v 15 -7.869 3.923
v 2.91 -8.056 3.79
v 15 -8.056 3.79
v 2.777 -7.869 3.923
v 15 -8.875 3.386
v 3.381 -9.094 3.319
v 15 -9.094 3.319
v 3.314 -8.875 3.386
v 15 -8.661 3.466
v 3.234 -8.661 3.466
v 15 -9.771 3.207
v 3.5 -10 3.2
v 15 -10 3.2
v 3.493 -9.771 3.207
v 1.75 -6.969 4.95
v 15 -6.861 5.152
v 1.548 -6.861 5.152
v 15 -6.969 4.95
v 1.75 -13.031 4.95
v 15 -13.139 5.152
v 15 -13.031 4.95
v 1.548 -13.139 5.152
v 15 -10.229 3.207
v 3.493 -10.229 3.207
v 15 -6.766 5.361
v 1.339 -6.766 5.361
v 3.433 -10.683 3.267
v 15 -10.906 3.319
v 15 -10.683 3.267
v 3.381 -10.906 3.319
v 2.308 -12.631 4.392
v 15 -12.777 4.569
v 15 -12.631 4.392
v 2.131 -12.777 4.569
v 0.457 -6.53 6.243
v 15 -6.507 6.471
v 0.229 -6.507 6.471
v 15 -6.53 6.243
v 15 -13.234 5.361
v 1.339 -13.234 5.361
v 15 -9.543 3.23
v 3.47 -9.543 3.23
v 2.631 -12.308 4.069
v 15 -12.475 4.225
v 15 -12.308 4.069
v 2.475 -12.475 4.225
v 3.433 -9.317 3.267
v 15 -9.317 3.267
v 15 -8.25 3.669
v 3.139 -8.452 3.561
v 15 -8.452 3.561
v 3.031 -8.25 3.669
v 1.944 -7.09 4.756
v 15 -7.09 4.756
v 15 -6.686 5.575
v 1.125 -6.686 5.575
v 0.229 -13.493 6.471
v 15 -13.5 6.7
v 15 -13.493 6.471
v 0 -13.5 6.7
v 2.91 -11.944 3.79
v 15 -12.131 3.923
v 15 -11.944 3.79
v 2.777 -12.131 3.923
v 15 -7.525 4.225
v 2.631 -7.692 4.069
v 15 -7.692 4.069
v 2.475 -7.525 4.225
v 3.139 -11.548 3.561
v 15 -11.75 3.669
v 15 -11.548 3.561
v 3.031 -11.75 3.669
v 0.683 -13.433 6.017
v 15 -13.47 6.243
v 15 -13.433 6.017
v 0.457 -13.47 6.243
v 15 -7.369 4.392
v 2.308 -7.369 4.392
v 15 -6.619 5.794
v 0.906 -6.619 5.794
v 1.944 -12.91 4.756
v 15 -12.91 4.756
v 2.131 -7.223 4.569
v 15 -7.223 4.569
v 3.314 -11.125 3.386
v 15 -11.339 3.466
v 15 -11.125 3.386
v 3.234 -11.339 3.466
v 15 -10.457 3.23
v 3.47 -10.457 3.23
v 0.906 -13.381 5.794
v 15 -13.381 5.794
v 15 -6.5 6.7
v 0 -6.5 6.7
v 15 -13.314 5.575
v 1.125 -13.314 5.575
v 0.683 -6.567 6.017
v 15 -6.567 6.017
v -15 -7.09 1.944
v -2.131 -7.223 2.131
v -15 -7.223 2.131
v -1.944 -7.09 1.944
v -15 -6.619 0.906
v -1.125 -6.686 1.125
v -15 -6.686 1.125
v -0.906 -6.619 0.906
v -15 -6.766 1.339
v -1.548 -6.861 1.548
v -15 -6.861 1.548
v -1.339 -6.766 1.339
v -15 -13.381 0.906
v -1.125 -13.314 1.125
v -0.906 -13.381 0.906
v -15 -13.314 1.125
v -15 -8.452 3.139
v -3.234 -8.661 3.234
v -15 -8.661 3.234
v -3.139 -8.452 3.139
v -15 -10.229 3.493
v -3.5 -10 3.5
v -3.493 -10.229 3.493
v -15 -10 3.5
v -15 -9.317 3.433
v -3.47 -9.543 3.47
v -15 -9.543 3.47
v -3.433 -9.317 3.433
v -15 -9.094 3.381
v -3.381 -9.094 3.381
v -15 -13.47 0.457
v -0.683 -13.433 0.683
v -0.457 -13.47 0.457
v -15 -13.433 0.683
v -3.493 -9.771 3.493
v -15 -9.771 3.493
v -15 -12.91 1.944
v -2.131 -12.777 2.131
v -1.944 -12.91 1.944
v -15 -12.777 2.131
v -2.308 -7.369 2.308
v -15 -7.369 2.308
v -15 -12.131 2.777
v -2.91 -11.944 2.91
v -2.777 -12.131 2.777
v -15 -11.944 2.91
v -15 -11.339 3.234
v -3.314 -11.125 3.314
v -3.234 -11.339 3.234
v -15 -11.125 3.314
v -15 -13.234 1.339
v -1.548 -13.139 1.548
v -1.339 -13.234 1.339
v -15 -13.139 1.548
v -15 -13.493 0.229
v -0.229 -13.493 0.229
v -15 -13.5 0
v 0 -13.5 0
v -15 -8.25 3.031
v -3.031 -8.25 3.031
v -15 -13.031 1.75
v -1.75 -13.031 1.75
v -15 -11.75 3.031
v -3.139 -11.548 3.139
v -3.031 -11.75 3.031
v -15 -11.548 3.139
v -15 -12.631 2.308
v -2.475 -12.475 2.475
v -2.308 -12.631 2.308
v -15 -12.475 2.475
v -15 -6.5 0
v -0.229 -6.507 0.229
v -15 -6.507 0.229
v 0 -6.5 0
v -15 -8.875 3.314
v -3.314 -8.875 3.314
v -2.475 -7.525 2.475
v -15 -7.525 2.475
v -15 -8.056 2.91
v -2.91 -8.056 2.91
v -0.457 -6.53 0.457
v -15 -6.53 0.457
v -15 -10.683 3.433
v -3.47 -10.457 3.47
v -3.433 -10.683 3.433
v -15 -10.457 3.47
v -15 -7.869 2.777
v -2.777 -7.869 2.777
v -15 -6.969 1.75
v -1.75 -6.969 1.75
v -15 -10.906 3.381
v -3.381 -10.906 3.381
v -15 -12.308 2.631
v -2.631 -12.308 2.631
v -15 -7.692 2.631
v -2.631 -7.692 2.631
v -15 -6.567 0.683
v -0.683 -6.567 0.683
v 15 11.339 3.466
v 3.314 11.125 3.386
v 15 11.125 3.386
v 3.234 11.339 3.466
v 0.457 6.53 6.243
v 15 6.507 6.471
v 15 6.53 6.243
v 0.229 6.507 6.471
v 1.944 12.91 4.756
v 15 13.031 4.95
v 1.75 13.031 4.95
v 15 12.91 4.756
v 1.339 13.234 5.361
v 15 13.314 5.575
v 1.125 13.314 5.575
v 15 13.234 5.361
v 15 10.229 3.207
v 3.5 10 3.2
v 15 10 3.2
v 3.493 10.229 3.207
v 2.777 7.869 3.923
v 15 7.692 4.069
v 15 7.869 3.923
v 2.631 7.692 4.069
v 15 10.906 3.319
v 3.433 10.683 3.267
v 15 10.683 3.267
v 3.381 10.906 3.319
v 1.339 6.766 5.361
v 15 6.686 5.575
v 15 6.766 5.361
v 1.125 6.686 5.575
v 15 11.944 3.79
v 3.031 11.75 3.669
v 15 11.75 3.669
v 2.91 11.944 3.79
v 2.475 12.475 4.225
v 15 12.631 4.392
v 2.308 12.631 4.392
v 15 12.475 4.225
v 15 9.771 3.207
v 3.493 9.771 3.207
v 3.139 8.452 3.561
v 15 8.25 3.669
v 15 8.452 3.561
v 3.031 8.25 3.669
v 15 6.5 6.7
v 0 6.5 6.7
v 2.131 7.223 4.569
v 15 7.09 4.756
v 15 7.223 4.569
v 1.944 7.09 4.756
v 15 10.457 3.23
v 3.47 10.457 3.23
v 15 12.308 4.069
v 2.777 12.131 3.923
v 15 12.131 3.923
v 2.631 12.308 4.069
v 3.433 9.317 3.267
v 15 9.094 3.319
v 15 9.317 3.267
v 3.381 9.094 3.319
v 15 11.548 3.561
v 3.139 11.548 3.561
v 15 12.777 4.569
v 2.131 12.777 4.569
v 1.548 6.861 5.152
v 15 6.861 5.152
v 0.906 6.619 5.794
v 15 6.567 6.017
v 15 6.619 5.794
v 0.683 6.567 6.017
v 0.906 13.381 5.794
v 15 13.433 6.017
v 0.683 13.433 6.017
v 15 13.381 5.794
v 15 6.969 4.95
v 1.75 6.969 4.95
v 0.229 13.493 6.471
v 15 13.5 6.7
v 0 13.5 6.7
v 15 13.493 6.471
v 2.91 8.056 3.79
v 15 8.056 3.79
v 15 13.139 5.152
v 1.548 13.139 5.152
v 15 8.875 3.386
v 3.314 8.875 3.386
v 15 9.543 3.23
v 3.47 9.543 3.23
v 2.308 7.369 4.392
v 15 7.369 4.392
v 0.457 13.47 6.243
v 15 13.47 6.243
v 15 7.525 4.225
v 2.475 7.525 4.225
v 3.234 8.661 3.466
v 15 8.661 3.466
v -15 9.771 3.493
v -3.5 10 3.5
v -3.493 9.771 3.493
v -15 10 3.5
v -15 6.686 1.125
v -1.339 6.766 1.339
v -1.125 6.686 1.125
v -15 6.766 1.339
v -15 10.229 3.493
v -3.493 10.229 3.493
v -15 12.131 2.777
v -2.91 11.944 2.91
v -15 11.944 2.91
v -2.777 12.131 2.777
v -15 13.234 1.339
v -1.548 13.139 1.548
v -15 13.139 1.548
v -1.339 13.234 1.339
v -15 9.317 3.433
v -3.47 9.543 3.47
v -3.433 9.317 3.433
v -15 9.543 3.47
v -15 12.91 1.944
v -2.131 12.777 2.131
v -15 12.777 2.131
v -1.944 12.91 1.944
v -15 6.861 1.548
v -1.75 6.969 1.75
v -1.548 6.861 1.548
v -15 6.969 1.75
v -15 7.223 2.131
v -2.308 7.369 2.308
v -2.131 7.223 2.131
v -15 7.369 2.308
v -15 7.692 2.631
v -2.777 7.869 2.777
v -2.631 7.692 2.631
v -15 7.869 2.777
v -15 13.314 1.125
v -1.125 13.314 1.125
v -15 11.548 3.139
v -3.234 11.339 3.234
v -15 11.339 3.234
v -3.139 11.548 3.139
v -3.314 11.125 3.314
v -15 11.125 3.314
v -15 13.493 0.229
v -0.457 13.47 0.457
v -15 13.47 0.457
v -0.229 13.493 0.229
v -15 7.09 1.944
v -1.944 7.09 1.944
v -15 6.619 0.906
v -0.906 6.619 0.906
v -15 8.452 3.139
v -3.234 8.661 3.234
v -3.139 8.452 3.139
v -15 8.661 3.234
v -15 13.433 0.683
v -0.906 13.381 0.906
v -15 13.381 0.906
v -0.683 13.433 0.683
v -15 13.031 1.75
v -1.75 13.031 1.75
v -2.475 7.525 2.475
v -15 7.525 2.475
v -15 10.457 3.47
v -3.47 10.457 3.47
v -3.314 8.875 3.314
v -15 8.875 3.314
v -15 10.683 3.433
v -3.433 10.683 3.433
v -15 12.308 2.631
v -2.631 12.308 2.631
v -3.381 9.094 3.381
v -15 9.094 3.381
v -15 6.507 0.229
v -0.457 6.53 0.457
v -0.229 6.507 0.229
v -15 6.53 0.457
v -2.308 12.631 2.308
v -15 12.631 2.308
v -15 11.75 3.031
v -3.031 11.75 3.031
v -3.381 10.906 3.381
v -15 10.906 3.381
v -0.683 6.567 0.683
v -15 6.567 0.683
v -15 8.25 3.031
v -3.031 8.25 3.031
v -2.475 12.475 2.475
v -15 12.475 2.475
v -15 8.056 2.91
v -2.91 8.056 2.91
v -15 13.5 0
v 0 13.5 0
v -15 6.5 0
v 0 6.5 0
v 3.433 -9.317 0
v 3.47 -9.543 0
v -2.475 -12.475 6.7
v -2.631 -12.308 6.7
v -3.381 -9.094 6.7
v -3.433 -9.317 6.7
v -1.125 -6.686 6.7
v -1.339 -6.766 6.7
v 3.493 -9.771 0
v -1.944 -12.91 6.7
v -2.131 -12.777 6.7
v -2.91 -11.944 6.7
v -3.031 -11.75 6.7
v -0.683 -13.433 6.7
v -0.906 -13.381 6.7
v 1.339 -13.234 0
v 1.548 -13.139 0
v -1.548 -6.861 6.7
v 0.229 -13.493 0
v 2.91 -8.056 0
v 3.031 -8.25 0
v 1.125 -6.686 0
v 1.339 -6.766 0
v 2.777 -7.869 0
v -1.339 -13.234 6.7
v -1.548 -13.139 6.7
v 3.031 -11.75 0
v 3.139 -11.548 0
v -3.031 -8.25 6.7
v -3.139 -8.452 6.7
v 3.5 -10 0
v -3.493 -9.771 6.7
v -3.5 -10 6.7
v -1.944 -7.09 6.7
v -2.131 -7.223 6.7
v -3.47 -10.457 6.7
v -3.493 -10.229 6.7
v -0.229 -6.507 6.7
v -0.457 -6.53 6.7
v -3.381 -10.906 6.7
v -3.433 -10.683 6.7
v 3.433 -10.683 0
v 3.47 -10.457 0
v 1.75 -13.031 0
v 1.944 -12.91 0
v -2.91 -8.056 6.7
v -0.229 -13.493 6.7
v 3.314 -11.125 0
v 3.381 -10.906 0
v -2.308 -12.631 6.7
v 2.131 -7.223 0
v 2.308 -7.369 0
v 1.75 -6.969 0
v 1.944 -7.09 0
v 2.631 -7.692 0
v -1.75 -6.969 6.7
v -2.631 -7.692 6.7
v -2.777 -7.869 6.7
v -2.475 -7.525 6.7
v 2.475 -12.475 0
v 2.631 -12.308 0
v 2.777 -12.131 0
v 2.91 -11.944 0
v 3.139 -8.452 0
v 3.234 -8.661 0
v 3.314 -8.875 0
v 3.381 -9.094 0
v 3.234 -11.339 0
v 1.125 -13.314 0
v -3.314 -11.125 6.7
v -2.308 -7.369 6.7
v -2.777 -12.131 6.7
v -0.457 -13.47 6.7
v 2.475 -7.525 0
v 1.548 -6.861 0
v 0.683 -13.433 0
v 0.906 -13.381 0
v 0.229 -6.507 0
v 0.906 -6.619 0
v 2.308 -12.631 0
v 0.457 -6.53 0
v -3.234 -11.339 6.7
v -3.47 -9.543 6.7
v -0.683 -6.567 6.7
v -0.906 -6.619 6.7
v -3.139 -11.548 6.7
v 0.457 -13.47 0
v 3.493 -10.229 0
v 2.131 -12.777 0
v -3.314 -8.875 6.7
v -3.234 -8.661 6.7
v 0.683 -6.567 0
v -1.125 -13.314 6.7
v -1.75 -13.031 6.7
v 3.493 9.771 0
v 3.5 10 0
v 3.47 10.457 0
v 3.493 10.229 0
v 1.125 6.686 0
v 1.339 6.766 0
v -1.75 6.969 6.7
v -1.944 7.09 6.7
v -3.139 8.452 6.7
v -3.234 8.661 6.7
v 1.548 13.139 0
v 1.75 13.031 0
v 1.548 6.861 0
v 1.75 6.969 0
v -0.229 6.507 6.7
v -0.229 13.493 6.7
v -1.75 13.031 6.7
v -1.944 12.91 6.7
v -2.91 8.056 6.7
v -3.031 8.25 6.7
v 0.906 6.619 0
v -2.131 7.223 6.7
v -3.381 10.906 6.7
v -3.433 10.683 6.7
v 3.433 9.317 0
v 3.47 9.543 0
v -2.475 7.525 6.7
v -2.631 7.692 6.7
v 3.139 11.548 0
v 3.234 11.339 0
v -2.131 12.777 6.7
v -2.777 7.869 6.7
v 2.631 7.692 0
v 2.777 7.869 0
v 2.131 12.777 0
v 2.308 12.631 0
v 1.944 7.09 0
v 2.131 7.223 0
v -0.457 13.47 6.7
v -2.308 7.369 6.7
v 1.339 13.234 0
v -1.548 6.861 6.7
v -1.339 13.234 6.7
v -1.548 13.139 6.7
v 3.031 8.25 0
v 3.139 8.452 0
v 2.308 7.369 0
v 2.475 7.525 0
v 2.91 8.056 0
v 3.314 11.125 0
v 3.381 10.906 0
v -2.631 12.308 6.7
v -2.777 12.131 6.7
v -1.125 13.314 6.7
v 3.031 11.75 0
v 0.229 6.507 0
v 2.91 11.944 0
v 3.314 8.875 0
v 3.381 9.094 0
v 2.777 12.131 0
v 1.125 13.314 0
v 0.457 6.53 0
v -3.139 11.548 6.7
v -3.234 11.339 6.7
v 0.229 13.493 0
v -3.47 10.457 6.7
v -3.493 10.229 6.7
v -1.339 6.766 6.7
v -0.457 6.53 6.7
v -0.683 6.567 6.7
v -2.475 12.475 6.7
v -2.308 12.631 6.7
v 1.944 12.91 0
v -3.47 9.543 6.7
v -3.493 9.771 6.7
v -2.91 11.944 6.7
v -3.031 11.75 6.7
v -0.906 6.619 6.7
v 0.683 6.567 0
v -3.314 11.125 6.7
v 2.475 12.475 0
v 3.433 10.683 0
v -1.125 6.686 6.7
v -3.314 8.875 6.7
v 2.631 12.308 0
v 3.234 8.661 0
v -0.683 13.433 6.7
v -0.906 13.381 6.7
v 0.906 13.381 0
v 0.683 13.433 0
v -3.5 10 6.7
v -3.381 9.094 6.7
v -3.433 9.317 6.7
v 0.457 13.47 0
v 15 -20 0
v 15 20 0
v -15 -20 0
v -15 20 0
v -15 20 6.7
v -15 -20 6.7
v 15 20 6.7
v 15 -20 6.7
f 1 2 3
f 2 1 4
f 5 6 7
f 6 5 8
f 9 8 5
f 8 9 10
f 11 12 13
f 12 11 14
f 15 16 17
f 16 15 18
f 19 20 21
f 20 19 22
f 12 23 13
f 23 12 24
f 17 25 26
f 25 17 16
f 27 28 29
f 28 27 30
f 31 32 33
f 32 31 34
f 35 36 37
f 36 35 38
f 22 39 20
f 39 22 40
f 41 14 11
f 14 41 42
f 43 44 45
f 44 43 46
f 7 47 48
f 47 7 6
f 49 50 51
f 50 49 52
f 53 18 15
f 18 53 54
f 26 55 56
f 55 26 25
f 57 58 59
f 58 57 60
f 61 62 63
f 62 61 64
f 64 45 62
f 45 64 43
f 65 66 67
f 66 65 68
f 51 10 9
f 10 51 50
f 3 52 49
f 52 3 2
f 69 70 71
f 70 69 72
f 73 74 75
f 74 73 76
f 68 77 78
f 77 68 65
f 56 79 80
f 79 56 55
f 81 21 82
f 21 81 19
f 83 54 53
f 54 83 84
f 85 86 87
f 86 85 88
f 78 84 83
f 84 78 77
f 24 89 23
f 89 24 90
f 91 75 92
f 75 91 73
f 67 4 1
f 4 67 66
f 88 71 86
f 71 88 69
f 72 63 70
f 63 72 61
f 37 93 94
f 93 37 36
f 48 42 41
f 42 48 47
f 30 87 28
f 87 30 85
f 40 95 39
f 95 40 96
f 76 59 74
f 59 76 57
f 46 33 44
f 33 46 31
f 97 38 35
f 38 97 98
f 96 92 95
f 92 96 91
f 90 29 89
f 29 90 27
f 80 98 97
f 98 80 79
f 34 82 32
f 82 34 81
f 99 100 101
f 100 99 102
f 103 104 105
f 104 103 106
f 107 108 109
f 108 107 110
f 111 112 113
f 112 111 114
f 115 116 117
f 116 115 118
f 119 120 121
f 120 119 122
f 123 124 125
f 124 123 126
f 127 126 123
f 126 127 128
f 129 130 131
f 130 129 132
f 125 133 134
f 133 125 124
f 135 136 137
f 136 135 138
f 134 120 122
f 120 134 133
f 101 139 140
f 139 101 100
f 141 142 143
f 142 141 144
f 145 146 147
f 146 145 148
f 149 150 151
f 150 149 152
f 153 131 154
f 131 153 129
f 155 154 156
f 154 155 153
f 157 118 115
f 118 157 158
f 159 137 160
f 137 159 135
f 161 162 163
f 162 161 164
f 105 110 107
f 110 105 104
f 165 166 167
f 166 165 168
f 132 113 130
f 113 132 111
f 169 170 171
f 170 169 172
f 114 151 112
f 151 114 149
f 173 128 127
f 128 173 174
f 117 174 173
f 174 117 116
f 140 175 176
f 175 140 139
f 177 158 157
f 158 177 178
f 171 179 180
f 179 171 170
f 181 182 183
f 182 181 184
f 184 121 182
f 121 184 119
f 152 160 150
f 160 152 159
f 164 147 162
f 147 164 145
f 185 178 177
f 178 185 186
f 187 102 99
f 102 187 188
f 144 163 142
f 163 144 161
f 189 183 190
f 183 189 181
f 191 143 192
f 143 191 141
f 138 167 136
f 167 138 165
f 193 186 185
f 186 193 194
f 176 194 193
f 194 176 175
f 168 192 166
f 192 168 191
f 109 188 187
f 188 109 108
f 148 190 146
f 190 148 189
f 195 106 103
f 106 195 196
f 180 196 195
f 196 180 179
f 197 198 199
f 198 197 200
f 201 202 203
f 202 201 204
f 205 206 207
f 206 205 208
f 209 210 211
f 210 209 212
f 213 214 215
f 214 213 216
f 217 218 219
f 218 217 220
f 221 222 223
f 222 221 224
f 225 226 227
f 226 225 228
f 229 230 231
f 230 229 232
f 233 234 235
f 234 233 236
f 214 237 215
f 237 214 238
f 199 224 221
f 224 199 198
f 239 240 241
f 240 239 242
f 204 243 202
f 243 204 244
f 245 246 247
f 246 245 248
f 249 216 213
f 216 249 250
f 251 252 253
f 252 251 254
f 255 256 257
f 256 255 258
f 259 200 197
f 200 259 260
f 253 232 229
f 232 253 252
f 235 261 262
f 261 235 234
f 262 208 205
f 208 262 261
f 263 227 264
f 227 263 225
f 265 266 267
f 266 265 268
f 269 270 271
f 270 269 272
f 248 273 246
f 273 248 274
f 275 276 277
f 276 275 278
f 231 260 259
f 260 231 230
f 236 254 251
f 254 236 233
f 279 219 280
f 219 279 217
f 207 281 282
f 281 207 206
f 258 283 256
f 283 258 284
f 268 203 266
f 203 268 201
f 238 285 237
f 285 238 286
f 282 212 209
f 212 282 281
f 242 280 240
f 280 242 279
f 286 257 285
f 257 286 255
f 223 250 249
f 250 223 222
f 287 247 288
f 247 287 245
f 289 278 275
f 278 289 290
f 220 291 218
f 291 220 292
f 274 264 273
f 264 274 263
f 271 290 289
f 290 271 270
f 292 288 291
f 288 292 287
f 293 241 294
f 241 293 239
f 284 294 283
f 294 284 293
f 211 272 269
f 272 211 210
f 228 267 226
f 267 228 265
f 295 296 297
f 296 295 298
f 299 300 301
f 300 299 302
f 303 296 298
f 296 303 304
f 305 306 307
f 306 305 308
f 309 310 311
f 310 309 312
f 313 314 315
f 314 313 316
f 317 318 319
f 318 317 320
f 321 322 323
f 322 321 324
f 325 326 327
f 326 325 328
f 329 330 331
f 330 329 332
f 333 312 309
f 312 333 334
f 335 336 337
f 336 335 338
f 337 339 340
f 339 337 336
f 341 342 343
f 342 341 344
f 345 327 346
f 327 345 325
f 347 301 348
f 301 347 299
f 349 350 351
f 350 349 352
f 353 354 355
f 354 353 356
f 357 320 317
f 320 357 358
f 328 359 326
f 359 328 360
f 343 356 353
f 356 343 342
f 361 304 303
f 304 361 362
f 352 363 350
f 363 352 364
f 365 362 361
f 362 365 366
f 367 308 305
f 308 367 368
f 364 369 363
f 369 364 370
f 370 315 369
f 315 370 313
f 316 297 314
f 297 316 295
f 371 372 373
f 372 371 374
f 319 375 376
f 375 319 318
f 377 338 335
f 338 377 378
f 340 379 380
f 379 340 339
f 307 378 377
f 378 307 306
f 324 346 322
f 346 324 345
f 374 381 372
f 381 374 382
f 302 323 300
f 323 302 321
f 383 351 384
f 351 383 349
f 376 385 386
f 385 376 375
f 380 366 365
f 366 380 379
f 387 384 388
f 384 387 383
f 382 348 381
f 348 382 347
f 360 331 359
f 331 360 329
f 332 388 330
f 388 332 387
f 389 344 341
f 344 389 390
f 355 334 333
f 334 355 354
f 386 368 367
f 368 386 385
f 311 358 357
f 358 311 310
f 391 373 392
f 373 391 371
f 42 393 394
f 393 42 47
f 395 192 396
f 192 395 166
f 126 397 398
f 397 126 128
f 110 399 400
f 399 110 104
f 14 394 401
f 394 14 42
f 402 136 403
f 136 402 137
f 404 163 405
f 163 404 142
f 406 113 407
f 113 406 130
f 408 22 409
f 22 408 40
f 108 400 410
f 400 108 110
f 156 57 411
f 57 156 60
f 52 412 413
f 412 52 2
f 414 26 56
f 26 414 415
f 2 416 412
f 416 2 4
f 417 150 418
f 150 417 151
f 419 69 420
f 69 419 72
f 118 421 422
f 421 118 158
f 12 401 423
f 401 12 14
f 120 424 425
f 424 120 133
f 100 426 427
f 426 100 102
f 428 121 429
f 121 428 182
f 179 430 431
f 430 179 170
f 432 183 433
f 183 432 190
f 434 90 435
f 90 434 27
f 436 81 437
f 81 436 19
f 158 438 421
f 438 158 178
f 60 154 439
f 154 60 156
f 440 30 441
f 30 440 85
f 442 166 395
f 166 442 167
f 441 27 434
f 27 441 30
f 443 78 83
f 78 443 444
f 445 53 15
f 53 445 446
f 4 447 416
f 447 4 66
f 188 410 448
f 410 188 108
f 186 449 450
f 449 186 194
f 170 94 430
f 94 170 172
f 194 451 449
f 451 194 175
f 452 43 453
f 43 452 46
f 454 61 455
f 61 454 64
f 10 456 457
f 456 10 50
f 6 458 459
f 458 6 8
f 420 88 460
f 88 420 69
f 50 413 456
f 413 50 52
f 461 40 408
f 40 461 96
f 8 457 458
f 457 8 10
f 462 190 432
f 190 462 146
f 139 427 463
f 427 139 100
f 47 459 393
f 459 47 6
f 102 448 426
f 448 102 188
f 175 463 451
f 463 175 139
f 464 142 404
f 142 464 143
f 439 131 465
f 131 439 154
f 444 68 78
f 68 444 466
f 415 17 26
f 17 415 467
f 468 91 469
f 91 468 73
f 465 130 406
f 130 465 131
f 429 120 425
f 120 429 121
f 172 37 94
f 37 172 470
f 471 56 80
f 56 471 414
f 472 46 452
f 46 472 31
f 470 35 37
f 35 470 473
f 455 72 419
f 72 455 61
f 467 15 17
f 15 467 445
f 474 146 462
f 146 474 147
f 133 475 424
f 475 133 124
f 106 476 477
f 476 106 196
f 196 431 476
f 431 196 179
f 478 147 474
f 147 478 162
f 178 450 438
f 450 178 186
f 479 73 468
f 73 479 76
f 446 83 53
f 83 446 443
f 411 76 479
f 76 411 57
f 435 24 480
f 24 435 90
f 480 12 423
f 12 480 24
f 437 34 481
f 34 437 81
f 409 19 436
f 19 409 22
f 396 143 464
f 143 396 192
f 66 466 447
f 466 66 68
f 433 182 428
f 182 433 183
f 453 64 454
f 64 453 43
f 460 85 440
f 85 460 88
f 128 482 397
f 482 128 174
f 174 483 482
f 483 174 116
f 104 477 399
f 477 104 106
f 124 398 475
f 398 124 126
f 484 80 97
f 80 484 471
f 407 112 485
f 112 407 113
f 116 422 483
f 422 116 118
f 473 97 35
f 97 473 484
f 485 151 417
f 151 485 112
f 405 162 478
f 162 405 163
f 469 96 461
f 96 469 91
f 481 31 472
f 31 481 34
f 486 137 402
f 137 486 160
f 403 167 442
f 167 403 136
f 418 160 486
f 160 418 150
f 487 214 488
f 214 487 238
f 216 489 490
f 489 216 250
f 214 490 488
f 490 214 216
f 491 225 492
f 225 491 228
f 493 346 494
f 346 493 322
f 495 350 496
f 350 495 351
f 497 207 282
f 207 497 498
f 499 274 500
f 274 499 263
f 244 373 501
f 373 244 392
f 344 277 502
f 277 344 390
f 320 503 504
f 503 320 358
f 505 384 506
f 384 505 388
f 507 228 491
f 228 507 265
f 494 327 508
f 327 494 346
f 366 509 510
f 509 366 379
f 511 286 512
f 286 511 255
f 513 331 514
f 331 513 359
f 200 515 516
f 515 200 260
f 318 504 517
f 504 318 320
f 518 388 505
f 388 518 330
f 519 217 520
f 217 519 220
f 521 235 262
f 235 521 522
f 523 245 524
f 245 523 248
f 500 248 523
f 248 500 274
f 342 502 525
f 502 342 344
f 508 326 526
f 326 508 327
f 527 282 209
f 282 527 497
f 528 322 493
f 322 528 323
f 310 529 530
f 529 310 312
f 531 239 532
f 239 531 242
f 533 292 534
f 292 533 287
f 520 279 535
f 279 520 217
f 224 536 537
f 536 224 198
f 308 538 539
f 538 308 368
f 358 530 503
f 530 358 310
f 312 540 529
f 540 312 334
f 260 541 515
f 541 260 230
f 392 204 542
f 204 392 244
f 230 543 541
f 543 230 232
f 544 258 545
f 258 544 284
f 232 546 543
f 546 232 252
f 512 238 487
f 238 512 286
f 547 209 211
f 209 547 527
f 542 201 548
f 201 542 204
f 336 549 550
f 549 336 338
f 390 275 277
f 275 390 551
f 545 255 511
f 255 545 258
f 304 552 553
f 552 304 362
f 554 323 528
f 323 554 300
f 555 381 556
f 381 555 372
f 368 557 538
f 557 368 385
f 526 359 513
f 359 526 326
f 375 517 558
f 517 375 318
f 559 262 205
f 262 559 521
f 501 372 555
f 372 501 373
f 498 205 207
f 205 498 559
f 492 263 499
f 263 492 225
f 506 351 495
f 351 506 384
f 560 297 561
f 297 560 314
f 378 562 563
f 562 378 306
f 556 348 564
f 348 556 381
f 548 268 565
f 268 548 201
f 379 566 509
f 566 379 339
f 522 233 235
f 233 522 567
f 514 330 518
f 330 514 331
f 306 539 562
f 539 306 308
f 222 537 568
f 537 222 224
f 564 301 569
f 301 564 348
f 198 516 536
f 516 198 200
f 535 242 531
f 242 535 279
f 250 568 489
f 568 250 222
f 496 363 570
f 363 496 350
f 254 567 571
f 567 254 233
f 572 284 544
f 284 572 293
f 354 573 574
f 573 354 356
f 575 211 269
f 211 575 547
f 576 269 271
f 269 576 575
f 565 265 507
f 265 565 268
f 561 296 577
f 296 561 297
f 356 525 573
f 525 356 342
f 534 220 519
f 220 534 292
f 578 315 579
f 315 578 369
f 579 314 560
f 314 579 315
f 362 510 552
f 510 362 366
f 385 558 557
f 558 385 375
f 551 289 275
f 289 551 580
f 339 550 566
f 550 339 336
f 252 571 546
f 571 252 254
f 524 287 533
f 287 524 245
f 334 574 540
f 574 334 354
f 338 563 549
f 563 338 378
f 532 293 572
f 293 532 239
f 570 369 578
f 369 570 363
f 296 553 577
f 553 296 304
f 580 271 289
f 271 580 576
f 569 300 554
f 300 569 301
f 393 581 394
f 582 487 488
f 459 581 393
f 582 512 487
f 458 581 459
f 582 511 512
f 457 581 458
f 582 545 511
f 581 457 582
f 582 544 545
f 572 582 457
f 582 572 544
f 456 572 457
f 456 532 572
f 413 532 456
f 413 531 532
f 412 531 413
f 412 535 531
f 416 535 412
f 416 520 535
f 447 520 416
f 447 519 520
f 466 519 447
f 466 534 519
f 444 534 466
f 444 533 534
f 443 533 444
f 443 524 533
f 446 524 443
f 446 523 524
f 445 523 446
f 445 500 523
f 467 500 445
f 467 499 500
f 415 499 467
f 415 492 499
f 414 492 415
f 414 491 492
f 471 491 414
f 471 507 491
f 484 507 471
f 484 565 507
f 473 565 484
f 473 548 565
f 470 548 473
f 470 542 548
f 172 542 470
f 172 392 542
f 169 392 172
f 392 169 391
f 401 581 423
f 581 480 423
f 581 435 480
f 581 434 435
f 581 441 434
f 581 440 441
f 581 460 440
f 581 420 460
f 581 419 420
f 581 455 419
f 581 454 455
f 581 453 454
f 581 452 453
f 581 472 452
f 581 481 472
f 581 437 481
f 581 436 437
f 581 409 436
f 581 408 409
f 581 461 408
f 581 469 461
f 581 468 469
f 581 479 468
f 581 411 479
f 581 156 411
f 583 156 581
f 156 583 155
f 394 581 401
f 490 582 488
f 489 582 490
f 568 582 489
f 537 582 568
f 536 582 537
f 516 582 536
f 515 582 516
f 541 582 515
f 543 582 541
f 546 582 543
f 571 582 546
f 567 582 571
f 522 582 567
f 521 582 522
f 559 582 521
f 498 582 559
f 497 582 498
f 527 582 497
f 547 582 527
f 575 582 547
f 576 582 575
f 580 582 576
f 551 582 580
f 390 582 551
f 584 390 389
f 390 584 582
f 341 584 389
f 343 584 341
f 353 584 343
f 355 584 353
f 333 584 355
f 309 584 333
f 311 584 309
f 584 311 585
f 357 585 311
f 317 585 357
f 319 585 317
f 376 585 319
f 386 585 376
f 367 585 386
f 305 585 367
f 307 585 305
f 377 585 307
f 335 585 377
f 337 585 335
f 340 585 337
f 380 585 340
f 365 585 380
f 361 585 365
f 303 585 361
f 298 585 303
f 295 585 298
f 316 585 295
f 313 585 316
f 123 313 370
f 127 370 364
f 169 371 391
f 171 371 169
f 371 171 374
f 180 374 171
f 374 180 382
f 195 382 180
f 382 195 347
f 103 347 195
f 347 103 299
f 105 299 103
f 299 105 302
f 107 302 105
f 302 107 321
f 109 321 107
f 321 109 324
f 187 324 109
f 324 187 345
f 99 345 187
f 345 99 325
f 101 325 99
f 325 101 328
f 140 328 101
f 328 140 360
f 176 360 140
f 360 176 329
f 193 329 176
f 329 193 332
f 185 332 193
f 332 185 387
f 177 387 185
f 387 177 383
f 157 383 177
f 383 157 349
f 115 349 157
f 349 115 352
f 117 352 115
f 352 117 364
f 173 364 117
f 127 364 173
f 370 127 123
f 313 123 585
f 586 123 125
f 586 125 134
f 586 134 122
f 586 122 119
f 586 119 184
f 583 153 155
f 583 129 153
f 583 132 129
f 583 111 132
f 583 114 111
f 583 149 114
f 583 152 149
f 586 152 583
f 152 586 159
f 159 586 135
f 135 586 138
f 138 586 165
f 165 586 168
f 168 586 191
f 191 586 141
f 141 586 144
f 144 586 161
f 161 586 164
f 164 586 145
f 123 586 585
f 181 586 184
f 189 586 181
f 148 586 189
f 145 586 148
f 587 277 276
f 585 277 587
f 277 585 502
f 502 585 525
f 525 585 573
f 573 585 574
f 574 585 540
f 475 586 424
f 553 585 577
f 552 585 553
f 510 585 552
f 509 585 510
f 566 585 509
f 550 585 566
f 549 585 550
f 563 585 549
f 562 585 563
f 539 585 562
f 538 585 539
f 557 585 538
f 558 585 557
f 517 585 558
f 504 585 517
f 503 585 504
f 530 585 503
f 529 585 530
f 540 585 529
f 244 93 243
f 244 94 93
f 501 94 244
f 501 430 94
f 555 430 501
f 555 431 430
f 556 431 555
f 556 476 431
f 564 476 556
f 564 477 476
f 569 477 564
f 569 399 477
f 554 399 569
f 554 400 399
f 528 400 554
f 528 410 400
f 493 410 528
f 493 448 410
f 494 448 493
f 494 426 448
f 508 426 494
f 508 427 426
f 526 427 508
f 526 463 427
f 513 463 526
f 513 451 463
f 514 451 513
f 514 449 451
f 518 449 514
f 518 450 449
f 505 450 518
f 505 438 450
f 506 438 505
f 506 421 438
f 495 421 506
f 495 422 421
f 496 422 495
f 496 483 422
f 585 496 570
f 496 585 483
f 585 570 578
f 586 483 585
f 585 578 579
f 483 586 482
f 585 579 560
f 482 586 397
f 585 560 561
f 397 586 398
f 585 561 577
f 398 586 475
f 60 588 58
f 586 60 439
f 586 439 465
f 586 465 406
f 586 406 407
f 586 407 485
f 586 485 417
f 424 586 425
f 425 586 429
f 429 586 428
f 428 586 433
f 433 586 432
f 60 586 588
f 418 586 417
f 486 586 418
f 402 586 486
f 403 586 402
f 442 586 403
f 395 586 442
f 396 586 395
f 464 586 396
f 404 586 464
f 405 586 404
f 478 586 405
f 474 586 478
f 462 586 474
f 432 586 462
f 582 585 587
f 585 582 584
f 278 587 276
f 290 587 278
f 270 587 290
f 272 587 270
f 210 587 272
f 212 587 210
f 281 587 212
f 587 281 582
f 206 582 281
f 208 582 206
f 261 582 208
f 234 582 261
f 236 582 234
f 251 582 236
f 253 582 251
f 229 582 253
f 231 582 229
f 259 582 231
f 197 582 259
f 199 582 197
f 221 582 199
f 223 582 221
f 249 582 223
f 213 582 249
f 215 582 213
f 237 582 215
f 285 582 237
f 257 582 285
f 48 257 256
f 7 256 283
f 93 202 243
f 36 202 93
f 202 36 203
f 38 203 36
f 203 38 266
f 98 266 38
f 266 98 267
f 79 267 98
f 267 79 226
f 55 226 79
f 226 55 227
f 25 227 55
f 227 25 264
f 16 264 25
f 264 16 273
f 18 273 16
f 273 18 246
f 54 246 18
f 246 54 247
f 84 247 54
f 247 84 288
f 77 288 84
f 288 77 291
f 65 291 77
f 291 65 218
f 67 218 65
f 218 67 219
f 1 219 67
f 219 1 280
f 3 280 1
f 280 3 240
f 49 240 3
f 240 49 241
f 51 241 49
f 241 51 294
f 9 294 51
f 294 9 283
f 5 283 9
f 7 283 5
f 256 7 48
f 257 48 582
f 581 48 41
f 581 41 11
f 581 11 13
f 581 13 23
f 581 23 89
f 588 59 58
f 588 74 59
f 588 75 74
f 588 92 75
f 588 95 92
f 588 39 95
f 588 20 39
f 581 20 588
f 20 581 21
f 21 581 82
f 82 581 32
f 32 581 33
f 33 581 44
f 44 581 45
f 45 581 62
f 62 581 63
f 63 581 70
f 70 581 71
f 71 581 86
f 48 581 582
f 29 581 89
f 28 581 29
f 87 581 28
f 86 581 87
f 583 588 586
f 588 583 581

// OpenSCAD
// file: ../../lib/cord_slots.scad
// The cord holes and the face troughs that carry the cord away from them.
//
// Everything here is a cutting tool, meant for the negative half of a
// difference() against the body.
//
// Each hole is a through-bore of diameter `dia`. From each hole a trough of
// the same diameter runs out to a side edge -- but the two troughs of a hole
// run to OPPOSITE edges: the watch-face trough (axis at z = t) to +X, the
// wrist-side trough (axis at z = 0) to -X.
//
// That opposition is the whole point. A strand entering the face channel
// drops through the hole and turns into the wrist channel heading the other
// way, so it makes two right-angle bends inside the body. The bends are the
// retention: the cord is held by its own path rather than by a knot or a
// pinch fit. It follows that the cord must be THREADED through the hole --
// away from the hole the two channels sit on opposite sides of the body and
// never meet, so there is no open slot to press it into.
//
// Each trough leaves `t - dia/2` of floor beneath it; the caller asserts that
// floor is thick enough.

module cord_cutter(wid, t, dia, holeY) {
    for (s = [-1, 1]) {
        translate([0, s * holeY, -1]) cylinder(h = t + 2, d = dia);
        cord_trough(wid, t, dia, holeY, s);
    }
}

// One face-pair of troughs for the hole at y = s * holeY. Each runs from the
// hole centre out to 1mm past its side wall, so it exits cleanly. Both holes
// share the same handedness, so the two face channels are parallel and the
// two wrist channels are parallel.
module cord_trough(wid, t, dia, holeY, s) {
    run = wid / 2 + 1;
    translate([0, s * holeY, t]) rotate([0,  90, 0]) cylinder(h = run, d = dia);
    translate([0, s * holeY, 0]) rotate([0, -90, 0]) cylinder(h = run, d = dia);
}
// file: ../../lib/body.scad
// The bare case body.
//
// A plain rectangular slab, square in plan. The lug horns run flush to the
// side walls, so a corner radius here would root them into the radius rather
// than into solid end material -- the failure the down counter's lug spec
// diagnosed and fixed by squaring the corners.

// `wid` across X, `len` along Y, centred on the origin in plan, sitting on z = 0.
module body_blank(len, wid, t) {
    linear_extrude(height = t) square([wid, len], center = true);
}
// main file
use <../../lib/body.scad>
use <../../lib/cord_slots.scad>

bodyLen = 40.0;
bodyWid = 30.0;
bodyT   =  6.7;
cordDia =  7.0;
holeY   = 10.0;
$fn = 96;

difference() {
    body_blank(bodyLen, bodyWid, bodyT);
    cord_cutter(bodyWid, bodyT, cordDia, holeY);
}
